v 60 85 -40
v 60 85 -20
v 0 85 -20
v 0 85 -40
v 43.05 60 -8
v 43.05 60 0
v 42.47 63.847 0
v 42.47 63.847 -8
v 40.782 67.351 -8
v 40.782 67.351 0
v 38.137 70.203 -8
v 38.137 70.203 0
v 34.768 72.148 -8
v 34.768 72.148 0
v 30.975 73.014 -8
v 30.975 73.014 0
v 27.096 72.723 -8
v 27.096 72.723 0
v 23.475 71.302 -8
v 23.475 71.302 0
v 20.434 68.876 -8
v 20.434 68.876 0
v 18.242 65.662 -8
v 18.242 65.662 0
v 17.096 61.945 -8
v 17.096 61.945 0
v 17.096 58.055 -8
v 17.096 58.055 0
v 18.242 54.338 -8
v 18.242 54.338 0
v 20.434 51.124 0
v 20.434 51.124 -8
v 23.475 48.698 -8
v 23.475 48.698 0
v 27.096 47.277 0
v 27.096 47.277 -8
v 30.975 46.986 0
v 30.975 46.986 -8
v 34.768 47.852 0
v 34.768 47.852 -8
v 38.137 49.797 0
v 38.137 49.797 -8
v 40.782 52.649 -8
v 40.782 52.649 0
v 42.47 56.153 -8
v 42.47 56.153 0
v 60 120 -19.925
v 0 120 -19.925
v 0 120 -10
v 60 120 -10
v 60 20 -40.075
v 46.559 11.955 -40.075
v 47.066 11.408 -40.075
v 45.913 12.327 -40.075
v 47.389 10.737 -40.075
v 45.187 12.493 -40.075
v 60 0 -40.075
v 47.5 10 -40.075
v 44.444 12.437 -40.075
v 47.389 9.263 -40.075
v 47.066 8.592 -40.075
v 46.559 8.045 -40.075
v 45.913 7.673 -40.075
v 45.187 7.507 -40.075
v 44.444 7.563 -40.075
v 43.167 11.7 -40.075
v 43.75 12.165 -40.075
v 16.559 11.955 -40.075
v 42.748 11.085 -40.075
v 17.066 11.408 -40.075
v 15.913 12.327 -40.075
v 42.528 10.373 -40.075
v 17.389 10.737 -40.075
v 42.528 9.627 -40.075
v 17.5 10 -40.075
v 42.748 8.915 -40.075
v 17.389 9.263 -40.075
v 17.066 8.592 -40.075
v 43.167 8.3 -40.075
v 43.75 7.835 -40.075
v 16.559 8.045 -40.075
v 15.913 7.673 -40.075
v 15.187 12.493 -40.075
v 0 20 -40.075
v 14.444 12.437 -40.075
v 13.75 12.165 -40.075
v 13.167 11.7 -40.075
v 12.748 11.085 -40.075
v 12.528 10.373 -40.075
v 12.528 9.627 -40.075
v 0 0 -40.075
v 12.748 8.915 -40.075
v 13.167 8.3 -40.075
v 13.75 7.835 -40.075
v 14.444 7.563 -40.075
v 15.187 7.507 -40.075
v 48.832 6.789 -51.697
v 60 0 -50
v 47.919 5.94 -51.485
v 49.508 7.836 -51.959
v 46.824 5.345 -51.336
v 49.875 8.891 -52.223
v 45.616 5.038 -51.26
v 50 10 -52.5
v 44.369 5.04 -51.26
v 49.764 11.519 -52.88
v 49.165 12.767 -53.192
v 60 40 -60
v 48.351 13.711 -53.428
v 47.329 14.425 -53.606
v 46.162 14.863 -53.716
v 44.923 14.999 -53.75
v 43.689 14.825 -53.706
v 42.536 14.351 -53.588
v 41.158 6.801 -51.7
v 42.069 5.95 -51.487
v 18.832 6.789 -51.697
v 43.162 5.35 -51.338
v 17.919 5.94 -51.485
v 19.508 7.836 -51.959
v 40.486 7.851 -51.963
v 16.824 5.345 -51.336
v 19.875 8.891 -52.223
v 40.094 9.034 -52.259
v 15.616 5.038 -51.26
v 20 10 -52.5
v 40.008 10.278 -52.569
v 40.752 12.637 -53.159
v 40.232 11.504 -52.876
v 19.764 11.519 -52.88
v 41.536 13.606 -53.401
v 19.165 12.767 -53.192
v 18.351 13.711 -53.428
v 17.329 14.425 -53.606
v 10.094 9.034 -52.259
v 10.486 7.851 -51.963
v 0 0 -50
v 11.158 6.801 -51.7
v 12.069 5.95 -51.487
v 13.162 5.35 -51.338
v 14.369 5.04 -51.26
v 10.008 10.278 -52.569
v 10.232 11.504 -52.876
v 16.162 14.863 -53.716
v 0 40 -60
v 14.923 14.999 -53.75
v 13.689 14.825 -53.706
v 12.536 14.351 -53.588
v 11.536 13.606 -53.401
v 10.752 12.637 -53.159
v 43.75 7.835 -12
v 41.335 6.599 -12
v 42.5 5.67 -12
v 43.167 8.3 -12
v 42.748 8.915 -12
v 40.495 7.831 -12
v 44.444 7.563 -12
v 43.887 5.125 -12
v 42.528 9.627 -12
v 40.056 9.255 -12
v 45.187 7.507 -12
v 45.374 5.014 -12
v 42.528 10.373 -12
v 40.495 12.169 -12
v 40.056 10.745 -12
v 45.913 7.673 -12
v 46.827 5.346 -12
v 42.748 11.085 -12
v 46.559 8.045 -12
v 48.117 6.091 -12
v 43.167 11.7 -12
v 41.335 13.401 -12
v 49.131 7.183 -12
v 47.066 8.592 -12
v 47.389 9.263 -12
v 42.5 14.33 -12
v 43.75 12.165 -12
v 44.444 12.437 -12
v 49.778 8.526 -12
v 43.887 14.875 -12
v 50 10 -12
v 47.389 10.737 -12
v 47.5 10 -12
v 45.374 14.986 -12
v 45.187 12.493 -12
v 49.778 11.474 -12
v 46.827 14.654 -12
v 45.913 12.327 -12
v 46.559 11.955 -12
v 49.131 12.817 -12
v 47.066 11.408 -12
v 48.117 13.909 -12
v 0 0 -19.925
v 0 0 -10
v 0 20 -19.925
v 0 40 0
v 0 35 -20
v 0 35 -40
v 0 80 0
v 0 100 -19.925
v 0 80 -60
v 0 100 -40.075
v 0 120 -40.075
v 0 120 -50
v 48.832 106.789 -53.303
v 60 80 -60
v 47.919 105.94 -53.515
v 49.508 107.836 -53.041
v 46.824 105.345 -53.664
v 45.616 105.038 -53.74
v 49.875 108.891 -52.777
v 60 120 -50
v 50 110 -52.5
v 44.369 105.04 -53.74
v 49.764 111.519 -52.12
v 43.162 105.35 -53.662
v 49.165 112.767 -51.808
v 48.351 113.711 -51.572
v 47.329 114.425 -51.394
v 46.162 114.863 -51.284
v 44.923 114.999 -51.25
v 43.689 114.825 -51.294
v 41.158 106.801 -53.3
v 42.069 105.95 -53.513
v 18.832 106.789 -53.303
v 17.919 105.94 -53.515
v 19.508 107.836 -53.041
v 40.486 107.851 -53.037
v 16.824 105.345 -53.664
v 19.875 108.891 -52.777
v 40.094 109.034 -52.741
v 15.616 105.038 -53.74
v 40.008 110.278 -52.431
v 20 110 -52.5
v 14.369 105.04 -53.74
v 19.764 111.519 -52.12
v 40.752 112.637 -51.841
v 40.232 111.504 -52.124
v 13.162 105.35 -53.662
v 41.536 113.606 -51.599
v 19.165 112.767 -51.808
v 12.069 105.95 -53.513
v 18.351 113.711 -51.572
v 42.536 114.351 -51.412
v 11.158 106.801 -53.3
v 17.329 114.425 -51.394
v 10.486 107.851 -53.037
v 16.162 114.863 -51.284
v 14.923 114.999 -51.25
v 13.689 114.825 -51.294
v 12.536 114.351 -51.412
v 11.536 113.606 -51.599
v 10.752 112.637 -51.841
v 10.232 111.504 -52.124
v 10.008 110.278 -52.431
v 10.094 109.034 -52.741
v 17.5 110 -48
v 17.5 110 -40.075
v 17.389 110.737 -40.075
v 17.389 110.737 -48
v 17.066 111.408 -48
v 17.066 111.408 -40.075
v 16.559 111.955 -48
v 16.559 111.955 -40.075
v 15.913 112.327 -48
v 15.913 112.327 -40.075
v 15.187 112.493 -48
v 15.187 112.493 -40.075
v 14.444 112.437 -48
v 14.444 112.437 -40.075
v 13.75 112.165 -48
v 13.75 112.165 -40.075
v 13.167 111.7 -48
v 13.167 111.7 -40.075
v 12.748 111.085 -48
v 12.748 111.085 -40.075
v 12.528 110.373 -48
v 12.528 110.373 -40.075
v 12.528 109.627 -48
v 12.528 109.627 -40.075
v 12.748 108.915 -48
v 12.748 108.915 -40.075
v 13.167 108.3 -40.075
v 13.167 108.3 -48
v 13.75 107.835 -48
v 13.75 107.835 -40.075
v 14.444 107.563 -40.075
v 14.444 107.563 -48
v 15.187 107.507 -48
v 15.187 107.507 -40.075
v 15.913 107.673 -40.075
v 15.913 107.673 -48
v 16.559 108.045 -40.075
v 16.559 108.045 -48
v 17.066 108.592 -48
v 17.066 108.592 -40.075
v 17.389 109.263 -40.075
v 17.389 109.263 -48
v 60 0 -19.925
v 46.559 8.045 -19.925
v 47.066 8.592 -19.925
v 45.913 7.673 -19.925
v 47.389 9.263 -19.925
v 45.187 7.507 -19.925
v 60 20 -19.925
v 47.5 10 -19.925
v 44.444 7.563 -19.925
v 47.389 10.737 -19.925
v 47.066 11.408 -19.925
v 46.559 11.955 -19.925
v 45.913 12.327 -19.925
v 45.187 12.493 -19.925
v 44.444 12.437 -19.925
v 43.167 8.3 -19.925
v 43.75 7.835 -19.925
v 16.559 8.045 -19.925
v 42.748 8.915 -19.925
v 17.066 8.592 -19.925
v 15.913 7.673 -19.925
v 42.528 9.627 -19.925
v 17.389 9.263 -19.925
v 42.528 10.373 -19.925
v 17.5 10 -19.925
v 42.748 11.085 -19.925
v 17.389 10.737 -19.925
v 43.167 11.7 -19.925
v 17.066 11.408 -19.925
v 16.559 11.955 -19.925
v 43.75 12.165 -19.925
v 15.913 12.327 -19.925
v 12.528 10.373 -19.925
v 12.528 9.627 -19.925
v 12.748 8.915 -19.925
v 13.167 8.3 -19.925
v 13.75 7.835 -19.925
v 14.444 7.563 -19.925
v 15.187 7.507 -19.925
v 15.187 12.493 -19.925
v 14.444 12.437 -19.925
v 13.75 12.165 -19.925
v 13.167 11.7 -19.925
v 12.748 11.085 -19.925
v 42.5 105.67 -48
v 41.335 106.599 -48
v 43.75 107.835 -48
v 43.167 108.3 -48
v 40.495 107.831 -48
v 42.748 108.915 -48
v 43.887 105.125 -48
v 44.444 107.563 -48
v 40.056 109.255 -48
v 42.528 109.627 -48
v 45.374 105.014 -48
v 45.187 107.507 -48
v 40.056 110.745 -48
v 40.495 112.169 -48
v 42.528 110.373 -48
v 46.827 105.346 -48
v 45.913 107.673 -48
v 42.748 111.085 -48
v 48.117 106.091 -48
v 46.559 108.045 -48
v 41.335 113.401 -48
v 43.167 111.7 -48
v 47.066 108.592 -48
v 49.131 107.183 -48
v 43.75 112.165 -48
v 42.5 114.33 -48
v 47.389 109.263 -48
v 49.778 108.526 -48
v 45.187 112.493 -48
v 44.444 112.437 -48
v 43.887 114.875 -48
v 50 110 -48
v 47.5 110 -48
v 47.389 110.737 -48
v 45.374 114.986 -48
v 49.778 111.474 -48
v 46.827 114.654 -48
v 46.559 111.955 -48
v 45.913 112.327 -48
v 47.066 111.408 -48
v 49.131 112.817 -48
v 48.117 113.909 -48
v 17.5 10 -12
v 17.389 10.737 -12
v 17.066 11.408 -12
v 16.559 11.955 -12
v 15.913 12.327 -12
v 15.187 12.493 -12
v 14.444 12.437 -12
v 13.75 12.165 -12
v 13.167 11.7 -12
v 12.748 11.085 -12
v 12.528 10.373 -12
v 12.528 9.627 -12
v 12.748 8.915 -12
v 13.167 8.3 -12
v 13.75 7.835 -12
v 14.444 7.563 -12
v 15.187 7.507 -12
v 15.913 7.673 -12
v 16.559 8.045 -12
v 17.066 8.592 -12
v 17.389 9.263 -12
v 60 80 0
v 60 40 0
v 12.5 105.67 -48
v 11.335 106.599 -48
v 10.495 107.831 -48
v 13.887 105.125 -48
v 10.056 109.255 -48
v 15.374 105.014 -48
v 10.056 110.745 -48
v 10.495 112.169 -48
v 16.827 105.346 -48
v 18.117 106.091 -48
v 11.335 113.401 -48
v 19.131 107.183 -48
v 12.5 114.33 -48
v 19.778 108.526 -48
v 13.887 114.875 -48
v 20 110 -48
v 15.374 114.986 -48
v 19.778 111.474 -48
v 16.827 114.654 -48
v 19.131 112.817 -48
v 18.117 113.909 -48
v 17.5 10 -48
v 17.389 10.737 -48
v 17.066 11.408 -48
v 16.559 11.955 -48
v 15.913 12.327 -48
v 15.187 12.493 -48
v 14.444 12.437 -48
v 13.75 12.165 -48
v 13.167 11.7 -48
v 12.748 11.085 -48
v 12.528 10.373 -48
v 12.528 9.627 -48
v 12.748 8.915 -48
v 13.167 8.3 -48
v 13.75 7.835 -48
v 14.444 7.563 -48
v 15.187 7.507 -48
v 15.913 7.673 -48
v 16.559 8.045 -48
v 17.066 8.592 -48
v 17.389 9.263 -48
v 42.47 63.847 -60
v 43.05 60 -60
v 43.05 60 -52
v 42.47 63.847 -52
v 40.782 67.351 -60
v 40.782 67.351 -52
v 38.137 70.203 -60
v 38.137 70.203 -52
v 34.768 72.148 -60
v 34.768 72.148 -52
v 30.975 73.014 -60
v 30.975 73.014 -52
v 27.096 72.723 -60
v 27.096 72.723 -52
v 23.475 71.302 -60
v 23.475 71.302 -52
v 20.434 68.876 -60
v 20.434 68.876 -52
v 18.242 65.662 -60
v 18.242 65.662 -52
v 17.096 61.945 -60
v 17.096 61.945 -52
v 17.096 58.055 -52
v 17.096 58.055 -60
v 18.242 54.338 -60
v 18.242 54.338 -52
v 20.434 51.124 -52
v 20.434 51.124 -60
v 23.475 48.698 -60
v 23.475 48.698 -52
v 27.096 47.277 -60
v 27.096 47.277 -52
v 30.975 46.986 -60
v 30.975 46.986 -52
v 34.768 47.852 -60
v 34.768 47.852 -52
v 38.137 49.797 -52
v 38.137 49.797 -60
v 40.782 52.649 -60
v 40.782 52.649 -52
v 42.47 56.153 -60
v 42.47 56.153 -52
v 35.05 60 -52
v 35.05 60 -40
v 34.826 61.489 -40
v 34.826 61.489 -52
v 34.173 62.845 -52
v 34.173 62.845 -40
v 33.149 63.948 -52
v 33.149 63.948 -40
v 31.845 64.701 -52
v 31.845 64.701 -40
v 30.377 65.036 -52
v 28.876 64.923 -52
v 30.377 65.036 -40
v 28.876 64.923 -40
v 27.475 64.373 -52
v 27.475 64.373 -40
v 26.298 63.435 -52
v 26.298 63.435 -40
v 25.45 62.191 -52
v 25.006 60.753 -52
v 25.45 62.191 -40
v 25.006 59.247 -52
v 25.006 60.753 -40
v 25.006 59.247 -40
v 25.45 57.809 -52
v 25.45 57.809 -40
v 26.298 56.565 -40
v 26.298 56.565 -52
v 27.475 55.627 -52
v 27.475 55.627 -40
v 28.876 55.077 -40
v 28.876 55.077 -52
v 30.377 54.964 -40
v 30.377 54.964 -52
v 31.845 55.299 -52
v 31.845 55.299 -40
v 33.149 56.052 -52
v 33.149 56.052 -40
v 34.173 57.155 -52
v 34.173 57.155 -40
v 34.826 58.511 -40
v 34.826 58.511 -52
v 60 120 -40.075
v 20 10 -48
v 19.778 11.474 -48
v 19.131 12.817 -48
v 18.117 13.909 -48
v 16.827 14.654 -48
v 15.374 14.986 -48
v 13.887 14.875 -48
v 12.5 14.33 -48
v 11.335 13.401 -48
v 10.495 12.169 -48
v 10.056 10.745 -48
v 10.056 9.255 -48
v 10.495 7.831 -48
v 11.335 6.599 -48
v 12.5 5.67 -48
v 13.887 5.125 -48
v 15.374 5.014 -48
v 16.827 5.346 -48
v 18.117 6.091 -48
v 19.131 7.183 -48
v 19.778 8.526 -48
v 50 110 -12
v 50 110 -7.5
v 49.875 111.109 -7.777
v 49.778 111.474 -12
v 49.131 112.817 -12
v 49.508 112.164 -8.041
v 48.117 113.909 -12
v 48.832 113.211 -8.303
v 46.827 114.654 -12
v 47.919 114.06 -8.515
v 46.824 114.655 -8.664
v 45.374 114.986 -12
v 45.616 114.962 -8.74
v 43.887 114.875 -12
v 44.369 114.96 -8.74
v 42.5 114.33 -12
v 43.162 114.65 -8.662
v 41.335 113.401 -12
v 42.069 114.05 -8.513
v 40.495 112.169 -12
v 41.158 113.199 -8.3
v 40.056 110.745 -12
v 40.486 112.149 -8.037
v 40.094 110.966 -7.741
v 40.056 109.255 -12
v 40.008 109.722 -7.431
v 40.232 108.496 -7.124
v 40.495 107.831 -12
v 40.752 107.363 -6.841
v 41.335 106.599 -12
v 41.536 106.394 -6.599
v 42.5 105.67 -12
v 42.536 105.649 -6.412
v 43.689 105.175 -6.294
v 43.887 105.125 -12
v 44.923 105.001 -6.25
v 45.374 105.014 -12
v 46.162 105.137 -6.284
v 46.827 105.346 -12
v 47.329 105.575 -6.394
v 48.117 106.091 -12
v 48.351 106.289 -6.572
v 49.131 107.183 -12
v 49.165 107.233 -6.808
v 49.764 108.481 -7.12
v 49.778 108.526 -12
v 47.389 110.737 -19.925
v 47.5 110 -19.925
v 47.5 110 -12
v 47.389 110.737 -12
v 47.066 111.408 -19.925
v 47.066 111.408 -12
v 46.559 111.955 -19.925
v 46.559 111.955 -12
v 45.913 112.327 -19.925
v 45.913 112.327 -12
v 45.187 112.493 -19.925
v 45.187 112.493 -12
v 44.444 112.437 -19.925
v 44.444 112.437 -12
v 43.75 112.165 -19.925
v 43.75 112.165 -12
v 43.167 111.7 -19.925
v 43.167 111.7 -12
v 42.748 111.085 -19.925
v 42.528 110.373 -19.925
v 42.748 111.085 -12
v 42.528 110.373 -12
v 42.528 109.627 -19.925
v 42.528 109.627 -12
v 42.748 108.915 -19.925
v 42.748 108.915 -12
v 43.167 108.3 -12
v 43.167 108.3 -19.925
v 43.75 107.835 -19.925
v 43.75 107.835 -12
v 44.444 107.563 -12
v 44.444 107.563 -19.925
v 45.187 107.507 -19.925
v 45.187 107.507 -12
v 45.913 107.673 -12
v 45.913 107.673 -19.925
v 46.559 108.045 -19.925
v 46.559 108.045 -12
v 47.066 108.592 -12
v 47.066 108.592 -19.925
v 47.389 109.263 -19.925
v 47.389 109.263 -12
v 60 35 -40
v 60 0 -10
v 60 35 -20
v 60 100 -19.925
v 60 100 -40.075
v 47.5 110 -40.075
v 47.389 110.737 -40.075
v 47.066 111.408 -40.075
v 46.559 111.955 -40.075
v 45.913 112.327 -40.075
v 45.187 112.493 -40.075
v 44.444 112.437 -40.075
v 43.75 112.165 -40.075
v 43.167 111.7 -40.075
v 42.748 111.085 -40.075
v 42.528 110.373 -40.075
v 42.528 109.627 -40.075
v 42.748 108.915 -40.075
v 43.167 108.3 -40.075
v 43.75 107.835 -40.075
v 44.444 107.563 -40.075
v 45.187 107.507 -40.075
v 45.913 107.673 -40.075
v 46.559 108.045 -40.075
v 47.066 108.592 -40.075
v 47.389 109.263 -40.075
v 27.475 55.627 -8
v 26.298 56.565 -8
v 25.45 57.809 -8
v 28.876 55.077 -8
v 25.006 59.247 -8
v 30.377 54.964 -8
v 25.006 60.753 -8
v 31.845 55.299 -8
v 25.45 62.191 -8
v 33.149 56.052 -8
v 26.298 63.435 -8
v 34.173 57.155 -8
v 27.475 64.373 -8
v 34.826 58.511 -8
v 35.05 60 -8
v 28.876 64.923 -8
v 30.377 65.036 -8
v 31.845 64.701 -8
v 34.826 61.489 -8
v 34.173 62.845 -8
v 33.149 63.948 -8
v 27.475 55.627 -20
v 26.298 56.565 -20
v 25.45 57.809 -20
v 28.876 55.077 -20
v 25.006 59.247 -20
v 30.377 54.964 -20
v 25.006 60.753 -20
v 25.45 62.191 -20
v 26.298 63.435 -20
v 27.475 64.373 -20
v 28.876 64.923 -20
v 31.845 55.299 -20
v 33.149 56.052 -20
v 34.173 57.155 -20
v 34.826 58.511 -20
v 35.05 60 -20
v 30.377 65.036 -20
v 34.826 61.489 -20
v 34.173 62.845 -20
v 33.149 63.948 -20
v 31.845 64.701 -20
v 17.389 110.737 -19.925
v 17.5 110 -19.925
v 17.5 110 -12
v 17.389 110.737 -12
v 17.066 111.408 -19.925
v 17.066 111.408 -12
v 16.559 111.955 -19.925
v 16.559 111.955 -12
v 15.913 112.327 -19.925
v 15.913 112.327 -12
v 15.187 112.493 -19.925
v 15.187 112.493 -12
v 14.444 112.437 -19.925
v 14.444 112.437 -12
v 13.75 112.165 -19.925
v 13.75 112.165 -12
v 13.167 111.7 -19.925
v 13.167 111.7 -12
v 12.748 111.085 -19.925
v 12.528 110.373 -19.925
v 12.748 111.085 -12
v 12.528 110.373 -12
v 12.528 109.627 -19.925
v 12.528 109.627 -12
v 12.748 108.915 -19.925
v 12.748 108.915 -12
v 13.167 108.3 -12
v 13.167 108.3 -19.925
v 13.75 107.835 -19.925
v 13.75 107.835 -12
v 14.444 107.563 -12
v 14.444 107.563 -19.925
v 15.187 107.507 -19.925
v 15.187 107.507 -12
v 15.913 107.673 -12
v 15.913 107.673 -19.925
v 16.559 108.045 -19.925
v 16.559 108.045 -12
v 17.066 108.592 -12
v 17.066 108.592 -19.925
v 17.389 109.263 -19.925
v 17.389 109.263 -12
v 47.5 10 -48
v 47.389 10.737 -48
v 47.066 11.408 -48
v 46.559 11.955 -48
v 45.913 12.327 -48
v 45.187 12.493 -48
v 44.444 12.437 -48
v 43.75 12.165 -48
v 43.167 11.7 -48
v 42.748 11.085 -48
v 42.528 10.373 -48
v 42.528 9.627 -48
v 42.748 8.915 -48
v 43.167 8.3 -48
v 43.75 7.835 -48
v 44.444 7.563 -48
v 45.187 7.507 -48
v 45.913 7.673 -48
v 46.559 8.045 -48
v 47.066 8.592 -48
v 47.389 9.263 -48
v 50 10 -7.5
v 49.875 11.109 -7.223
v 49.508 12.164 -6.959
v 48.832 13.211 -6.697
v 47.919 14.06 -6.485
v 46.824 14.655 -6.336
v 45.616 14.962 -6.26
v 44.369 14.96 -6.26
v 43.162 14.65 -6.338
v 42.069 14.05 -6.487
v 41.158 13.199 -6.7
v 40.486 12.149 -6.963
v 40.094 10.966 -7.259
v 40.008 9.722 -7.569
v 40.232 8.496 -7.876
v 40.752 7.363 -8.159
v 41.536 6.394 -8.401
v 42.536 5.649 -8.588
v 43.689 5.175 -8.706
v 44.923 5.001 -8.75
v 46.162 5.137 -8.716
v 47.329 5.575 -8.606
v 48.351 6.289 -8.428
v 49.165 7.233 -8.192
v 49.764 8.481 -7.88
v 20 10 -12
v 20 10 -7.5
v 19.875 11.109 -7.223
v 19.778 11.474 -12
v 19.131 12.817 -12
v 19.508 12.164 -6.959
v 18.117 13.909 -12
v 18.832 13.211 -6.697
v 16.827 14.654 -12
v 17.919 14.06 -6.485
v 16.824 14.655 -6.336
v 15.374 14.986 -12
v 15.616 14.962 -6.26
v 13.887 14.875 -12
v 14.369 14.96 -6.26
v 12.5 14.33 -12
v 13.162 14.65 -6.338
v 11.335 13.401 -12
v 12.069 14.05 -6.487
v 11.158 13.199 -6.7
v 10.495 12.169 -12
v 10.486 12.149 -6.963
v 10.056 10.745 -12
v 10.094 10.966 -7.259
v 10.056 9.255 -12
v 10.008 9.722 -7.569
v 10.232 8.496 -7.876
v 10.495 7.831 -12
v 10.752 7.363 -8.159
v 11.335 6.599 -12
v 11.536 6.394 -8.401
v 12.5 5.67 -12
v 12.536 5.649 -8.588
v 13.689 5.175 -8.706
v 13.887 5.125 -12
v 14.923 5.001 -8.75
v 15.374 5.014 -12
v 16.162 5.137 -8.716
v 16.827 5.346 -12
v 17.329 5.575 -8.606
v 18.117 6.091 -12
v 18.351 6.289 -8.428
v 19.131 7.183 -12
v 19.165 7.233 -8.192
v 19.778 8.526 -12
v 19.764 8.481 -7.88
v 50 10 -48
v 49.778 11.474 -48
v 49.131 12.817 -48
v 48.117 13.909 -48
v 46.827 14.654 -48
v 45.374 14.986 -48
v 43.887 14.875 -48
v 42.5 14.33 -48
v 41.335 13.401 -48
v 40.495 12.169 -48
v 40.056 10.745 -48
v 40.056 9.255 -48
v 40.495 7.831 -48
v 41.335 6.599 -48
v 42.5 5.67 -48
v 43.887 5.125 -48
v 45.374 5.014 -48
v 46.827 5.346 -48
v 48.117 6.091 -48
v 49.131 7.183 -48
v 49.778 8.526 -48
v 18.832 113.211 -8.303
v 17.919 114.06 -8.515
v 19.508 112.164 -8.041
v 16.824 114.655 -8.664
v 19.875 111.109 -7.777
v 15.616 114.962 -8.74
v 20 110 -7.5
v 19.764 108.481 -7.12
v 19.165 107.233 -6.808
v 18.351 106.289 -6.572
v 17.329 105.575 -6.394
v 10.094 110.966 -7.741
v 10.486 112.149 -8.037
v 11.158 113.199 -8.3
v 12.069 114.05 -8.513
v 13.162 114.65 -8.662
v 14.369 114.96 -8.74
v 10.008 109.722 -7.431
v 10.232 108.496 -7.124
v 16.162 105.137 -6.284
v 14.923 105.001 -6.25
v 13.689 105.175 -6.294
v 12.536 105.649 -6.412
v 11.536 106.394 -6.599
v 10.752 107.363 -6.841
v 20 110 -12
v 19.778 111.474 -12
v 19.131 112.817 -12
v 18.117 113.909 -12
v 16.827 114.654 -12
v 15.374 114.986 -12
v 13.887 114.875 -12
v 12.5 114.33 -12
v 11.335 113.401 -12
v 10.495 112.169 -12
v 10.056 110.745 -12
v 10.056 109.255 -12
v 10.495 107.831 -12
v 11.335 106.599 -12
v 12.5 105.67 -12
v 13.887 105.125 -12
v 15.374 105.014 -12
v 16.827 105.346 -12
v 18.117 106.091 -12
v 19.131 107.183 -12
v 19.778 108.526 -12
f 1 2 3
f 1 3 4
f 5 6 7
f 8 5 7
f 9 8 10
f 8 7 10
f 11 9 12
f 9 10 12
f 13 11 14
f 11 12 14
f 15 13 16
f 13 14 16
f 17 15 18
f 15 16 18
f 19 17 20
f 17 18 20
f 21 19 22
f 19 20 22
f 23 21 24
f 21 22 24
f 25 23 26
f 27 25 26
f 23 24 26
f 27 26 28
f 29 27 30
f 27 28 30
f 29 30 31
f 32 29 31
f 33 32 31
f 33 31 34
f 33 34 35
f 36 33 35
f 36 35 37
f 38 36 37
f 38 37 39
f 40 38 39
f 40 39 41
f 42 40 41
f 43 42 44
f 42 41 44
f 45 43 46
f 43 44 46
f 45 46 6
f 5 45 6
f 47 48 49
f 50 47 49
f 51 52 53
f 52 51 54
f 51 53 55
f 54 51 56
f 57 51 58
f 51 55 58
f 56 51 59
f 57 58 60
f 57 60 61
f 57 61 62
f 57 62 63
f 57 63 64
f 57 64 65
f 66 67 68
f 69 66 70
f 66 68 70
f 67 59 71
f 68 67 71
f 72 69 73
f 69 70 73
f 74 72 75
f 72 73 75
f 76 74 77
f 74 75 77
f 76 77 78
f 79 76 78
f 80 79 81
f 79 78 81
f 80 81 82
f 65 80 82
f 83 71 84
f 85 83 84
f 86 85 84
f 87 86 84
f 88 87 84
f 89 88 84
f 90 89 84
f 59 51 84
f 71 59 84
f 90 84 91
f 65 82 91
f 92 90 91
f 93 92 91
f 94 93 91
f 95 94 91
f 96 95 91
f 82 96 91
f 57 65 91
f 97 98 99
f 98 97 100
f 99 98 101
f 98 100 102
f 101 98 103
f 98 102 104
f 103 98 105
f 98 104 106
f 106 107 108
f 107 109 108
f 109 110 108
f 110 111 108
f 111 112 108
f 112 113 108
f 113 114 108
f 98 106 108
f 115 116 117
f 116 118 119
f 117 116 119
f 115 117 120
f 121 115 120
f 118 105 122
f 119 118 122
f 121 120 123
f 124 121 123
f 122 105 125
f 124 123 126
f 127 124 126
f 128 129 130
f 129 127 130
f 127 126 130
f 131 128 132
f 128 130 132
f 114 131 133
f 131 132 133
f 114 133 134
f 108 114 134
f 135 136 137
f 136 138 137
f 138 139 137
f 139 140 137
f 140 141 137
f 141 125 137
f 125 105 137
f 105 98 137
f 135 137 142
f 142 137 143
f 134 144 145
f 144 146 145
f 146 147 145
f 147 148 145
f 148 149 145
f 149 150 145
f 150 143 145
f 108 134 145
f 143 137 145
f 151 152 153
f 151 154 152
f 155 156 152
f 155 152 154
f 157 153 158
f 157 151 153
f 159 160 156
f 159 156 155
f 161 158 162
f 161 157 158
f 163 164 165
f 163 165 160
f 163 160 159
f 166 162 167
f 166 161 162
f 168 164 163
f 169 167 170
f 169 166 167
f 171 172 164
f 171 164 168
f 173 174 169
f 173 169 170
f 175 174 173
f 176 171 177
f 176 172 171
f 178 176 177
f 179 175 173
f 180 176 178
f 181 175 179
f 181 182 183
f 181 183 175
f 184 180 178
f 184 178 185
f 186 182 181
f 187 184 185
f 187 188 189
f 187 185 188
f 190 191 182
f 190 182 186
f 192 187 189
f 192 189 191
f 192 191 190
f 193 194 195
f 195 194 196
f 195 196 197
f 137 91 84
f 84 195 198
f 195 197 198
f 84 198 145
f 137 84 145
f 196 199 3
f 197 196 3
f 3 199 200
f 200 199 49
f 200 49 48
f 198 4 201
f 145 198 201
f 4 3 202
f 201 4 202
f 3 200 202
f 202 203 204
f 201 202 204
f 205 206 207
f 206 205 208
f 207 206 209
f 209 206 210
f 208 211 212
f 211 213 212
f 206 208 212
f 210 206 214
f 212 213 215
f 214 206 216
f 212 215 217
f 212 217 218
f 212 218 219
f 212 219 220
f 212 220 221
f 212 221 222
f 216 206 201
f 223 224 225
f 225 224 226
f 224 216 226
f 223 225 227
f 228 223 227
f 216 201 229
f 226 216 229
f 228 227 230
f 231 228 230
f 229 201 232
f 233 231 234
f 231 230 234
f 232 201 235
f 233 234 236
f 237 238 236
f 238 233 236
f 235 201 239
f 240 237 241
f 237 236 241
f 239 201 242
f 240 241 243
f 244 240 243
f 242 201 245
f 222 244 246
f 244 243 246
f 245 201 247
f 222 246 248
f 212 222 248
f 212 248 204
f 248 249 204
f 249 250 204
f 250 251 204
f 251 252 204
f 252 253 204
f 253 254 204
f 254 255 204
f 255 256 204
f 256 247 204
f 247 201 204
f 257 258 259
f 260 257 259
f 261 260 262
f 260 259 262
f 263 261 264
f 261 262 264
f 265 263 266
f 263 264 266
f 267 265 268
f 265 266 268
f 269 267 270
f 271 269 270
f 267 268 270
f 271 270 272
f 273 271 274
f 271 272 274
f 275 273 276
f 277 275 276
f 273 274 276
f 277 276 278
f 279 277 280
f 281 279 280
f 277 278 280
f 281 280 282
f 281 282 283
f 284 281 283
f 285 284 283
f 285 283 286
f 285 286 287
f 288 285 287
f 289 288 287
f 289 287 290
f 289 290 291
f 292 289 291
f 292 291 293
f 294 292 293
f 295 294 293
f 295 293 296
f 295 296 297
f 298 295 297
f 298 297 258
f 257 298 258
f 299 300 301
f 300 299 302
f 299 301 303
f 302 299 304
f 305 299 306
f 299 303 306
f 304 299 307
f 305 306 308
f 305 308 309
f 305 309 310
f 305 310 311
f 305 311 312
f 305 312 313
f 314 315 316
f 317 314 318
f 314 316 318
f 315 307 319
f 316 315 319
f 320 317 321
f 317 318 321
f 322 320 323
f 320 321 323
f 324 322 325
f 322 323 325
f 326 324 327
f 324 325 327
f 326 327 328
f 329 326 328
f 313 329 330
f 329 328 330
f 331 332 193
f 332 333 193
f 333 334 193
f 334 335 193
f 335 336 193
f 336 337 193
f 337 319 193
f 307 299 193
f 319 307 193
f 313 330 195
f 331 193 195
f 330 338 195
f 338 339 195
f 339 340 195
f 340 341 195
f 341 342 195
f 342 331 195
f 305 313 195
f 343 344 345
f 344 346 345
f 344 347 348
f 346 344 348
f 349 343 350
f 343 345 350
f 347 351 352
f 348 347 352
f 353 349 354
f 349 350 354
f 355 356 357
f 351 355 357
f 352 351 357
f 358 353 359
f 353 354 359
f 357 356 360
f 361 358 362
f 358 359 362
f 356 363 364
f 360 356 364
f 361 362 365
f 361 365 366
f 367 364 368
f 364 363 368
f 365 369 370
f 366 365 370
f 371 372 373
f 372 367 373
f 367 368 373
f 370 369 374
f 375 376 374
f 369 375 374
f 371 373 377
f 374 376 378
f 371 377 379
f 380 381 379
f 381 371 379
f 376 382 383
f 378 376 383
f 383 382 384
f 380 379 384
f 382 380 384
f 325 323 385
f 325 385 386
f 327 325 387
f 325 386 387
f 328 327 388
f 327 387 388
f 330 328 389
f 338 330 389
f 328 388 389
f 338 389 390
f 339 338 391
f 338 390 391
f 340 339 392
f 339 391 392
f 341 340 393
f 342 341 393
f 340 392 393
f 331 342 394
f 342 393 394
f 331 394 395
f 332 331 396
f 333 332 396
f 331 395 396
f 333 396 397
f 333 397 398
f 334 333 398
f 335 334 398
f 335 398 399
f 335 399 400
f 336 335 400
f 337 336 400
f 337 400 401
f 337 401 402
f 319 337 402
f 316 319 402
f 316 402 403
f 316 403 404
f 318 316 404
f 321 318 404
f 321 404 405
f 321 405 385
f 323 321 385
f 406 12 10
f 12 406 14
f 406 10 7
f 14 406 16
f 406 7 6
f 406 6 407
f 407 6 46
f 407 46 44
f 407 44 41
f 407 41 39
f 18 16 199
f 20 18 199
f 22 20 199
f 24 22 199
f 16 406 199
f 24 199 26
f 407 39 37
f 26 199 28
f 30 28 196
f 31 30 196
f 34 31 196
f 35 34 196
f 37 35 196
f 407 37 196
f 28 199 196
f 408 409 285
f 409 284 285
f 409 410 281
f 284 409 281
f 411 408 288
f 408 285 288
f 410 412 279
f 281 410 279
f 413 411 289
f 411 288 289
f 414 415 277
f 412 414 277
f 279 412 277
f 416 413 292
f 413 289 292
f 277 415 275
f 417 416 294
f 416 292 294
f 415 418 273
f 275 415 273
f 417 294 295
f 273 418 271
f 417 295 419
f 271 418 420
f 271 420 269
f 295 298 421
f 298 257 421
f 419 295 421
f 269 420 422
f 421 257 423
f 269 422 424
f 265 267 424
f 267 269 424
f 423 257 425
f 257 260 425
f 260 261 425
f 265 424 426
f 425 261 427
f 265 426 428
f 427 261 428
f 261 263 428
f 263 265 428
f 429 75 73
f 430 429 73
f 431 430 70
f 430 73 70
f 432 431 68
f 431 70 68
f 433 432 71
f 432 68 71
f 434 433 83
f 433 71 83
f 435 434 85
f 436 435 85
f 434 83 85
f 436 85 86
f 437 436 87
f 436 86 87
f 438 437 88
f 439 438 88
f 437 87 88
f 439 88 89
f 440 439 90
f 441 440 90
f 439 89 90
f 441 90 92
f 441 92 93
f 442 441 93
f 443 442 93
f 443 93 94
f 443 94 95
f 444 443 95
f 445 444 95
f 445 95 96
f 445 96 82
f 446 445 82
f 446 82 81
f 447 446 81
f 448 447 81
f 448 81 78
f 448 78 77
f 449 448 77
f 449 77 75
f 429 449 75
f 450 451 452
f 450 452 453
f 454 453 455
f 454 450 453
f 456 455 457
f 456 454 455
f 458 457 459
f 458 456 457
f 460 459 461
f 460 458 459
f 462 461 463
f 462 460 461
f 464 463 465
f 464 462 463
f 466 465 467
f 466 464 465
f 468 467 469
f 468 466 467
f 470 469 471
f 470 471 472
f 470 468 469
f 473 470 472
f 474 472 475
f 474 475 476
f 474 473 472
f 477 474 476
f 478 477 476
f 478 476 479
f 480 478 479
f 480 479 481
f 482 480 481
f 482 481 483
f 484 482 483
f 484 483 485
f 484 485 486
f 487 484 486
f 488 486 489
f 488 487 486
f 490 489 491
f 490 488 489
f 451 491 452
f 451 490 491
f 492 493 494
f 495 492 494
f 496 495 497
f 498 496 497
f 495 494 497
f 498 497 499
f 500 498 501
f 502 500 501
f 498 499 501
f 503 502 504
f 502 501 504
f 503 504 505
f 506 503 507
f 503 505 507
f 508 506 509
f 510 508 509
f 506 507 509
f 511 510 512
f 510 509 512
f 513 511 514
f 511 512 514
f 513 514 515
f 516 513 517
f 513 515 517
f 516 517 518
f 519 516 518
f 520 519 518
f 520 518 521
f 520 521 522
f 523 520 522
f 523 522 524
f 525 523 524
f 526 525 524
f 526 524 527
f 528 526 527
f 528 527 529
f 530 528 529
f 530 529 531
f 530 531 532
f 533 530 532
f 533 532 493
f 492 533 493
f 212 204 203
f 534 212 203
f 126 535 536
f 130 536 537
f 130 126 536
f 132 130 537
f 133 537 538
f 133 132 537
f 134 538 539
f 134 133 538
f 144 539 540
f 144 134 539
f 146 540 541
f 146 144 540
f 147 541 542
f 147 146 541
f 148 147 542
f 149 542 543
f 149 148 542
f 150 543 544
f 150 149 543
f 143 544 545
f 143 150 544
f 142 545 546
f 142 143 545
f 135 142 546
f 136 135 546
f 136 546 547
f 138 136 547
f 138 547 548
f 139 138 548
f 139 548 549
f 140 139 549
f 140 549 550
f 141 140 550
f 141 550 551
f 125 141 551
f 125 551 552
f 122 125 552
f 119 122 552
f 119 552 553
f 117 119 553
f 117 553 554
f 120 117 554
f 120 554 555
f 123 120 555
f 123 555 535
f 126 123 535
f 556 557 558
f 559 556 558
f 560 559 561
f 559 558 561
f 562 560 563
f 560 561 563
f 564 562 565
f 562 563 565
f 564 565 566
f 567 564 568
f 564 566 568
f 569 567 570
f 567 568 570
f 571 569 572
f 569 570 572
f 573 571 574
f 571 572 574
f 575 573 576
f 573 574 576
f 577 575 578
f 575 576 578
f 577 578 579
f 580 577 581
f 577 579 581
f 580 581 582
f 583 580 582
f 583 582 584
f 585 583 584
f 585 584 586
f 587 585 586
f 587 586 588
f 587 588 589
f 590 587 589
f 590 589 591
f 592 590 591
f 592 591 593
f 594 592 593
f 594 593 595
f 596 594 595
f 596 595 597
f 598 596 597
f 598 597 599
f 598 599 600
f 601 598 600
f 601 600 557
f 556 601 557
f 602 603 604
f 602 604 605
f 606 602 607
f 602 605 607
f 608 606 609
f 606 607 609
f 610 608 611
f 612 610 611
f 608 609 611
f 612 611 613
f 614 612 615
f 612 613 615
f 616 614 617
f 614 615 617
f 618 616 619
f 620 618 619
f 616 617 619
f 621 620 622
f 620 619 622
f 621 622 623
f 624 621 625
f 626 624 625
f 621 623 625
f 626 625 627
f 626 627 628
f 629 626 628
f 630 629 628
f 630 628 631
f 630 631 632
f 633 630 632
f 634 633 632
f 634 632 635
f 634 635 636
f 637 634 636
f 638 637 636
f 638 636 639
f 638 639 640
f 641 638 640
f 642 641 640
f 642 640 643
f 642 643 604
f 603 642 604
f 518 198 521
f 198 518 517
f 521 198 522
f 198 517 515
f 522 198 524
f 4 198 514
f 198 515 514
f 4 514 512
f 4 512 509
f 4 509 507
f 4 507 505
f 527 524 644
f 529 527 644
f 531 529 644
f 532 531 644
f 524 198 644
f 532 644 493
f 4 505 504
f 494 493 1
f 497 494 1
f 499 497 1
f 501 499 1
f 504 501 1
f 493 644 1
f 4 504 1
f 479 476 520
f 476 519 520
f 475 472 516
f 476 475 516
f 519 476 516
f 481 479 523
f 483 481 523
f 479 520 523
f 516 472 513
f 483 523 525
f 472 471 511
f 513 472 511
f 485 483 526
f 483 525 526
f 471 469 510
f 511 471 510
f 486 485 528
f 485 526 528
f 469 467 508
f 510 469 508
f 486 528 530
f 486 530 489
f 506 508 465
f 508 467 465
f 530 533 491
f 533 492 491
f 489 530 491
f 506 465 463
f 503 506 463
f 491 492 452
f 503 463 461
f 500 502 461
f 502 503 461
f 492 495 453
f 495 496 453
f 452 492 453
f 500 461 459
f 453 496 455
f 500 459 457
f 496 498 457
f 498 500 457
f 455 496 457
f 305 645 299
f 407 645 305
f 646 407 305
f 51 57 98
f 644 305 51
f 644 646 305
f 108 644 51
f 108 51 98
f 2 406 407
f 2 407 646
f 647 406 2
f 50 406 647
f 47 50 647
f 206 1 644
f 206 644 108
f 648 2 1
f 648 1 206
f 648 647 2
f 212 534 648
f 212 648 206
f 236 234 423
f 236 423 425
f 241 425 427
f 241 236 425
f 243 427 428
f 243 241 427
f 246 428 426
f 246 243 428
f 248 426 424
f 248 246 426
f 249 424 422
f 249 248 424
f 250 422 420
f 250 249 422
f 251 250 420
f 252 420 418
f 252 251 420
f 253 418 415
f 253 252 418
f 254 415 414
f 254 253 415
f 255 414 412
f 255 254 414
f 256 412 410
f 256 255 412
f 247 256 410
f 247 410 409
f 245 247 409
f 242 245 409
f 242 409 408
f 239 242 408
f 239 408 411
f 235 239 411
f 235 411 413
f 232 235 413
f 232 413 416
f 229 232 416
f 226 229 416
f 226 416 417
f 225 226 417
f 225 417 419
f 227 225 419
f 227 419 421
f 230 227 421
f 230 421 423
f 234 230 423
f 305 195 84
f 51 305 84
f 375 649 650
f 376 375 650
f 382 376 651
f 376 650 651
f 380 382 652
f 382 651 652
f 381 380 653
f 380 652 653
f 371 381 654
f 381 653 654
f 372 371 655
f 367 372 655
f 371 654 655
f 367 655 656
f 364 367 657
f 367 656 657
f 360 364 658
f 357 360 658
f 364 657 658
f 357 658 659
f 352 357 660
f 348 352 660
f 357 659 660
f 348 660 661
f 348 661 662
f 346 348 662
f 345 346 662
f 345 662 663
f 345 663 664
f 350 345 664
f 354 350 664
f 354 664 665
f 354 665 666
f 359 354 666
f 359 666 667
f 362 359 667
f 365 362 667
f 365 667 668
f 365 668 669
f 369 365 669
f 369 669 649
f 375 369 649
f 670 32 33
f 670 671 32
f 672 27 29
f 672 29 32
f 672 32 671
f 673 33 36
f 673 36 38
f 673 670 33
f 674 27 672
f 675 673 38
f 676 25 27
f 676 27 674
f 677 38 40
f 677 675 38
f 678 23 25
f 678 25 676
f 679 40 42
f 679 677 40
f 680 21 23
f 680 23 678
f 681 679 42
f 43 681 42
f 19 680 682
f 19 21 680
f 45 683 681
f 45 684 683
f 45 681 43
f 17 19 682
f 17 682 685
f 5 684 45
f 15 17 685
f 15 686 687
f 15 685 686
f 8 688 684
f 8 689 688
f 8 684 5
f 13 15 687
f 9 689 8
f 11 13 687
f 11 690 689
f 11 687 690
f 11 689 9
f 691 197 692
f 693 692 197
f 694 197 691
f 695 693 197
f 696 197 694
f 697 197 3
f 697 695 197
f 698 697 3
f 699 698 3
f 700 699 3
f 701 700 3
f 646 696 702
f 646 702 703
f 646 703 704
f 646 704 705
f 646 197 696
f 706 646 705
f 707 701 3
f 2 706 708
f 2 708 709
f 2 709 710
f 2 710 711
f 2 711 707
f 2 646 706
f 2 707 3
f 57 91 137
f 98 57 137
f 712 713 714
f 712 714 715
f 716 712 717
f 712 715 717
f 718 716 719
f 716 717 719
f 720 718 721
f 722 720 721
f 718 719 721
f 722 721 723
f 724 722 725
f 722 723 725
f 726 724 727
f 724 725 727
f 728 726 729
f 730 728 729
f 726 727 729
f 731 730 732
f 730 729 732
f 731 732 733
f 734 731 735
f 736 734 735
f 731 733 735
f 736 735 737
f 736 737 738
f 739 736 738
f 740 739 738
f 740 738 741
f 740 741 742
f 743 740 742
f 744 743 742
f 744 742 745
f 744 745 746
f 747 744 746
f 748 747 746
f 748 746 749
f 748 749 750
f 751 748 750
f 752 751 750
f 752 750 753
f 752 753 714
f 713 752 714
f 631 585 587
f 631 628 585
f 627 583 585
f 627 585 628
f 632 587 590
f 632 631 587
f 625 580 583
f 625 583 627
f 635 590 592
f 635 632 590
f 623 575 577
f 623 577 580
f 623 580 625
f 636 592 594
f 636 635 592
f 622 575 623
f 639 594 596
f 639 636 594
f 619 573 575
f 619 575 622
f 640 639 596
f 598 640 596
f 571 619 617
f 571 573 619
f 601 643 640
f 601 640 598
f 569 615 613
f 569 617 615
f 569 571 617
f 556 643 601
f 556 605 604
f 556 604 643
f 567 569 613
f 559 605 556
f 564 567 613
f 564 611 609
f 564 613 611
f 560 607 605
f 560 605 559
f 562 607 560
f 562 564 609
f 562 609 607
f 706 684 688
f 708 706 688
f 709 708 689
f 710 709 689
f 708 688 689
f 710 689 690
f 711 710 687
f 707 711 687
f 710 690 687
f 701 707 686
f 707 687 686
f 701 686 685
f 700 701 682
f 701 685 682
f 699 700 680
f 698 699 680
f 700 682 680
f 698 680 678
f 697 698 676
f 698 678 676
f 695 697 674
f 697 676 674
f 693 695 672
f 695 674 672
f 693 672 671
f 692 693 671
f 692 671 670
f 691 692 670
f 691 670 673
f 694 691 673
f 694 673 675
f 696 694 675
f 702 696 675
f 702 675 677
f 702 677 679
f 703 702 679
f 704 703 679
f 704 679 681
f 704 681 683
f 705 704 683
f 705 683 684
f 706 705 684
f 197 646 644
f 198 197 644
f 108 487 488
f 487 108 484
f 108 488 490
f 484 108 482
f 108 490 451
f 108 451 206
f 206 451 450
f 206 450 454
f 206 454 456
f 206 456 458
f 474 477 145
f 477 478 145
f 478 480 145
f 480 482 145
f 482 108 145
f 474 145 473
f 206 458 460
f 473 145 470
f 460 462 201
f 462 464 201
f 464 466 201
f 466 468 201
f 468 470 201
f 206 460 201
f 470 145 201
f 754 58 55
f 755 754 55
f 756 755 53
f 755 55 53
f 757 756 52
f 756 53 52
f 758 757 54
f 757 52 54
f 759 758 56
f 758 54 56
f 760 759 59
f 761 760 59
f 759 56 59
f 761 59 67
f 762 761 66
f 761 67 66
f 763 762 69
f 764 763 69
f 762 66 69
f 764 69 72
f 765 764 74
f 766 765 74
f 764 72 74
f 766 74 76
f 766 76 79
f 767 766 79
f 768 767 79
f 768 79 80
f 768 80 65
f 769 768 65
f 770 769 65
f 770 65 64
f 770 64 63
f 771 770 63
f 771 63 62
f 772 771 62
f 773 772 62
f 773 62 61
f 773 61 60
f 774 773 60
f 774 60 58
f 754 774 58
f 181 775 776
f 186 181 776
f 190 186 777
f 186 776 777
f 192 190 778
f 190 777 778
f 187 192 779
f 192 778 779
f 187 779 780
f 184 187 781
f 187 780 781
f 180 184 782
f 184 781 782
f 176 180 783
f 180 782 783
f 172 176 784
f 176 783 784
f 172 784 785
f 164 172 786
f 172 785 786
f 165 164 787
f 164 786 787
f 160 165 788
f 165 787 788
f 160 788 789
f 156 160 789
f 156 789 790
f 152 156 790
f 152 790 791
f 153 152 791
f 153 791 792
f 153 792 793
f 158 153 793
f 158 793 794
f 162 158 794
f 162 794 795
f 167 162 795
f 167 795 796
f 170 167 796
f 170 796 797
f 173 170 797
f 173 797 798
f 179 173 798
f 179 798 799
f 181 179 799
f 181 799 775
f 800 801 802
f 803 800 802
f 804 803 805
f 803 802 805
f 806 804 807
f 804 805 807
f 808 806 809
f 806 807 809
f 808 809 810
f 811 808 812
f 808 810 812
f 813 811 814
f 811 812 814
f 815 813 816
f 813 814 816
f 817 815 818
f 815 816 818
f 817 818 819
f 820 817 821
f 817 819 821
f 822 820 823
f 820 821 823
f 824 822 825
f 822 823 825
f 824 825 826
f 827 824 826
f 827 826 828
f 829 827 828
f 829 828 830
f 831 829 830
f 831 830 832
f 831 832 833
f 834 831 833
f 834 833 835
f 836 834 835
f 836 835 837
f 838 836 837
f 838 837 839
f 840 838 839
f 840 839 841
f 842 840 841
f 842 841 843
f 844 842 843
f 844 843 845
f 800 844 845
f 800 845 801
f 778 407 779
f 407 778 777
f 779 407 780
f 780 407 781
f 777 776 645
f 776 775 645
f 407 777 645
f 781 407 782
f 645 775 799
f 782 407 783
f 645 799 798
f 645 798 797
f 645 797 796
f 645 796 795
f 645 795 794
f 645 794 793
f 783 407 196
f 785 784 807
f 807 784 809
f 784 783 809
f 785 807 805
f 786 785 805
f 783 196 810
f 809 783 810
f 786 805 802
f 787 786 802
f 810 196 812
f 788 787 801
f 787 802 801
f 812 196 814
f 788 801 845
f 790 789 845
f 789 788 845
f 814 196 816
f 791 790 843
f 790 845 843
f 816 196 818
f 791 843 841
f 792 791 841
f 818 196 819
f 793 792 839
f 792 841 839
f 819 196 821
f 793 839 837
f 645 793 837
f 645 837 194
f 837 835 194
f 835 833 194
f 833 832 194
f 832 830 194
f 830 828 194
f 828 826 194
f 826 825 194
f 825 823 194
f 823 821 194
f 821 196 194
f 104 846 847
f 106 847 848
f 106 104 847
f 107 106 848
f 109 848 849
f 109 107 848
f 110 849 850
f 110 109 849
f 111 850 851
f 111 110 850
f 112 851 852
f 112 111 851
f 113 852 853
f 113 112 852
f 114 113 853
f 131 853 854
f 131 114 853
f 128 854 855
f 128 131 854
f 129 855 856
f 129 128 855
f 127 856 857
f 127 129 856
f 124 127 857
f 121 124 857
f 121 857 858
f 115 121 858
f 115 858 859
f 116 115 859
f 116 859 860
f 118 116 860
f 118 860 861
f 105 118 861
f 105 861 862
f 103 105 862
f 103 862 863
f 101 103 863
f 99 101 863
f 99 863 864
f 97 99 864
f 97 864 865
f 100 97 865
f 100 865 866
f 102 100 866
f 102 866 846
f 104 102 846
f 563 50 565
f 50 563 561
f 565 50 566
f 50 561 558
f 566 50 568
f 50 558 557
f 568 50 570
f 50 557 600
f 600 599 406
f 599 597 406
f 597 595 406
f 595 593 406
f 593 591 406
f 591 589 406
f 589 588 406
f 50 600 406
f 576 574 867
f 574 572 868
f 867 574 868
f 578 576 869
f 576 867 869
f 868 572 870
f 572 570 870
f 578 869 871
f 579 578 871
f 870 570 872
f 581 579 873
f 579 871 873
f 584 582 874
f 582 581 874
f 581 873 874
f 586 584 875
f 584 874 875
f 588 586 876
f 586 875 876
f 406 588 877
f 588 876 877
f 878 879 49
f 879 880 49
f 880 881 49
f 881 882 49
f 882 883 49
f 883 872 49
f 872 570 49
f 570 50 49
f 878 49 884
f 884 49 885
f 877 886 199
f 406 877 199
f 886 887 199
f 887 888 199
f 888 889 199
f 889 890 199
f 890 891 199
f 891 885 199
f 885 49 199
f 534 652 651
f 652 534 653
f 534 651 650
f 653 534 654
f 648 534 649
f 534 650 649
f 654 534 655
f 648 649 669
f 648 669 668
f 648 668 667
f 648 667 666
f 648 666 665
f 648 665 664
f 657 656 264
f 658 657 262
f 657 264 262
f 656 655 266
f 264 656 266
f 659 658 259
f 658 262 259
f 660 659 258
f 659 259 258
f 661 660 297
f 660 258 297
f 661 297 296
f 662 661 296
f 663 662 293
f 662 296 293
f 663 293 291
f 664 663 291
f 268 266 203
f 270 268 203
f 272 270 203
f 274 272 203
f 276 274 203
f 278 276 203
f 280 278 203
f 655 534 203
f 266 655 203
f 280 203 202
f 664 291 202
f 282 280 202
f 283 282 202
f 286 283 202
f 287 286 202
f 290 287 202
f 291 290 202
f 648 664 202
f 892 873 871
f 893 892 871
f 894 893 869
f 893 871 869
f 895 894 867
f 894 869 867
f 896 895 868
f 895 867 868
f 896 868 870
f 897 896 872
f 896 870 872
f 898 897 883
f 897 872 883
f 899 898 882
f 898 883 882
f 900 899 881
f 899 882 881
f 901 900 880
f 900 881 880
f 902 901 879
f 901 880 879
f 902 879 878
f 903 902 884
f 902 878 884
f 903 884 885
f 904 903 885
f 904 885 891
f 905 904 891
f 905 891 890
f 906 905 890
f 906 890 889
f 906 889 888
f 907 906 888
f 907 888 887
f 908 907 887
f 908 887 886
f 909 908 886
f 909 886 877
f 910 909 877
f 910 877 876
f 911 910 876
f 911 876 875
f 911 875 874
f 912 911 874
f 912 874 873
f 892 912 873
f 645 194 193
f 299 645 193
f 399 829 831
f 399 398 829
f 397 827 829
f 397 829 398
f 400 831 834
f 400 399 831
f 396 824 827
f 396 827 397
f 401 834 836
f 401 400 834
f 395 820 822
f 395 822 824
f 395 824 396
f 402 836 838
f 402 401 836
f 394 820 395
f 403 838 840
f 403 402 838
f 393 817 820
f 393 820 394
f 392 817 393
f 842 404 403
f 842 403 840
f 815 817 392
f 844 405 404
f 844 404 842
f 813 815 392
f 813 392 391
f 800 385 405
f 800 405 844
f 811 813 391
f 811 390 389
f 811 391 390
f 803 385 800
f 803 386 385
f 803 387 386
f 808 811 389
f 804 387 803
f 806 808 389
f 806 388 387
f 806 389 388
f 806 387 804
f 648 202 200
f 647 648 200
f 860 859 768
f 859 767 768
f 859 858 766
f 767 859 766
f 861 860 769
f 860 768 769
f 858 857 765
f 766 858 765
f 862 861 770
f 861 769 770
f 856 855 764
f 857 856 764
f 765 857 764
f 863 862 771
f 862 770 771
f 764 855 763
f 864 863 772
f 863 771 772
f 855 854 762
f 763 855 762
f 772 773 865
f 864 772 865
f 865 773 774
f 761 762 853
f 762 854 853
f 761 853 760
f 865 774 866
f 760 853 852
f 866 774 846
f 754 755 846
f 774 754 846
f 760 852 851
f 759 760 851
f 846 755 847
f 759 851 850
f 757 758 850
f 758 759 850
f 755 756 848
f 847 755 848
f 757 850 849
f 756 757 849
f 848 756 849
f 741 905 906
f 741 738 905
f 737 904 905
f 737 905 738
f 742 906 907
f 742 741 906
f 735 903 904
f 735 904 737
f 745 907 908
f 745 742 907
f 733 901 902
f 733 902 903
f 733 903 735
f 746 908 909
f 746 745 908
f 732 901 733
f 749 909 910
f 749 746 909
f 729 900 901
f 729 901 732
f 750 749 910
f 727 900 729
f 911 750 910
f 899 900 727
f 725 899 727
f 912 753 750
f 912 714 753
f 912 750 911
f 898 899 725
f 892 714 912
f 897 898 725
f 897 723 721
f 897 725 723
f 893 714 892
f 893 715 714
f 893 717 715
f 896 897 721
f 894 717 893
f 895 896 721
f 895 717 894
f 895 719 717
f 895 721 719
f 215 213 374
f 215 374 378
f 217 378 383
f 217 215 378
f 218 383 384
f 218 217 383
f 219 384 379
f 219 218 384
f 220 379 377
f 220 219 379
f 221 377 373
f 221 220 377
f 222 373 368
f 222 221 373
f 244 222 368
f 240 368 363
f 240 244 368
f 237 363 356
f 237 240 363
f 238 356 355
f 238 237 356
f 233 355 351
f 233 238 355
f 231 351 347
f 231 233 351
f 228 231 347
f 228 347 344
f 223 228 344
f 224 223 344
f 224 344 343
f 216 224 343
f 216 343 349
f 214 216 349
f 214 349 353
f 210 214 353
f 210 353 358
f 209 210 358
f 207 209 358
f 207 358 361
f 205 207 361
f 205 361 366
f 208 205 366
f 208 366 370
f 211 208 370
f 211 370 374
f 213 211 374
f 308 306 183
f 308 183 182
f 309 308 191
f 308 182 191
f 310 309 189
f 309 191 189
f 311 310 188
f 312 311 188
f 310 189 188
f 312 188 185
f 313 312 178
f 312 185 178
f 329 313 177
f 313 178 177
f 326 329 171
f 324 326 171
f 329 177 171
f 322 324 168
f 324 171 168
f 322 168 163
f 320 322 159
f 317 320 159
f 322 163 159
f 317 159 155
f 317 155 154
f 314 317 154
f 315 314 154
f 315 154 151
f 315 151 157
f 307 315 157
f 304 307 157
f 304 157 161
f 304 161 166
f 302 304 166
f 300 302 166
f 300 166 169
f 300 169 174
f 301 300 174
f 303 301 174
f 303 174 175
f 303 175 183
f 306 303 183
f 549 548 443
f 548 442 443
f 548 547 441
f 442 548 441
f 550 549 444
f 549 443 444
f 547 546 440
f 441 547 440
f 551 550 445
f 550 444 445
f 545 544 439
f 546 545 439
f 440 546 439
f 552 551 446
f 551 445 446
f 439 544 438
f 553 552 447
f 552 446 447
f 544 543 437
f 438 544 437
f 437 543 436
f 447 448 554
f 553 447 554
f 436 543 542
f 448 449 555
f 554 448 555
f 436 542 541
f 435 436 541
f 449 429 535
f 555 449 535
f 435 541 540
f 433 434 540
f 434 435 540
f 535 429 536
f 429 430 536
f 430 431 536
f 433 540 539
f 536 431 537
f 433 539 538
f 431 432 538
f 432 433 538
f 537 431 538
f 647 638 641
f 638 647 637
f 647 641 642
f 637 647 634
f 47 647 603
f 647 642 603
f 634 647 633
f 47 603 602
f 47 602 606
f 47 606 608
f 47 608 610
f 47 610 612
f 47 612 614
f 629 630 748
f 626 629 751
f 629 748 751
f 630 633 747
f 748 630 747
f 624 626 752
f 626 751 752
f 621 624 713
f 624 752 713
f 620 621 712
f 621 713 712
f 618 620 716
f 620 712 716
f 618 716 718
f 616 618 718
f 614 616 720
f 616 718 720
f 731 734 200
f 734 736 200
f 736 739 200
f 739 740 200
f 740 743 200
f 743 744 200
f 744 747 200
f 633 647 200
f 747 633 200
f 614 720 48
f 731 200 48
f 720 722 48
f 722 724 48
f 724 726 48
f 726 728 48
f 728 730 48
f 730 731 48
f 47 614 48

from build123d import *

# Parameters (mm, degrees)
BOSS_EXTRUDE1_DEPTH = 60
SKETCH3_R           = 5.05
CUT_EXTRUDE1_DEPTH  = 70
SKETCH4_R           = 13.05
CUT_EXTRUDE2_DEPTH  = 8
SKETCH5_R           = 2.5
CUT_EXTRUDE3_DEPTH  = 61
SKETCH6_R           = 5
CUT_EXTRUDE4_DEPTH  = 12
SKETCH7_W           = 20
SKETCH7_H           = 50
CUT_EXTRUDE5_DEPTH  = 81


with BuildPart() as part:
    # Sketch2 → Boss-Extrude1 (new body)
    with BuildSketch(Plane(origin=(0, 0, 0), x_dir=(0, 0, -1), z_dir=(1, 0, 0))):
        Polygon((0, 40), (10, 0), (19.925, 0), (19.925, 20), (40.075, 20), (40.075, 0), (50, 0), (60, 40), (60, 80), (50, 120), (40.075, 120), (40.075, 100), (19.925, 100), (19.925, 120), (10, 120), (0, 80), align=None)
    extrude(amount=BOSS_EXTRUDE1_DEPTH)

    # Sketch3 → Cut-Extrude1 (cut)
    with BuildSketch(Plane.XY):
        with Locations((30, 60)):
            Circle(SKETCH3_R)
    extrude(amount=-CUT_EXTRUDE1_DEPTH, mode=Mode.SUBTRACT)

    # Sketch4 → Cut-Extrude2 (cut)
    with BuildSketch(Plane.XY):
        with Locations((30, 60)):
            Circle(SKETCH4_R)
    cut_extrude2 = extrude(amount=-CUT_EXTRUDE2_DEPTH, mode=Mode.SUBTRACT)

    # Mirror1: Cut-Extrude2 across plane
    add(cut_extrude2.mirror(Plane.XY.offset(-30)), mode=Mode.SUBTRACT)

    # Sketch5 → Cut-Extrude3 (cut, through all)
    with BuildSketch(Plane.XY):
        with Locations((45, 110)):
            Circle(SKETCH5_R)
        with Locations((15, 110)):
            Circle(SKETCH5_R)
        with Locations((45, 10)):
            Circle(SKETCH5_R)
        with Locations((15, 10)):
            Circle(SKETCH5_R)
    extrude(amount=-CUT_EXTRUDE3_DEPTH, mode=Mode.SUBTRACT)

    # Sketch6 → Cut-Extrude4 (cut)
    with BuildSketch(Plane.XY):
        with Locations((45, 110)):
            Circle(SKETCH6_R)
        with Locations((15, 110)):
            Circle(SKETCH6_R)
        with Locations((15, 10)):
            Circle(SKETCH6_R)
        with Locations((45, 10)):
            Circle(SKETCH6_R)
    cut_extrude4 = extrude(amount=-CUT_EXTRUDE4_DEPTH, mode=Mode.SUBTRACT)

    # Mirror2: Cut-Extrude4 across plane
    add(cut_extrude4.mirror(Plane.XY.offset(-30)), mode=Mode.SUBTRACT)

    # Sketch7 → Cut-Extrude5 (cut)
    with BuildSketch(Plane(origin=(60, 0, 0), x_dir=(0, 0, -1), z_dir=(1, 0, 0))):
        with Locations((30, 60)):
            Rectangle(SKETCH7_W, SKETCH7_H)
    extrude(amount=-CUT_EXTRUDE5_DEPTH, mode=Mode.SUBTRACT)


solid = part.part
